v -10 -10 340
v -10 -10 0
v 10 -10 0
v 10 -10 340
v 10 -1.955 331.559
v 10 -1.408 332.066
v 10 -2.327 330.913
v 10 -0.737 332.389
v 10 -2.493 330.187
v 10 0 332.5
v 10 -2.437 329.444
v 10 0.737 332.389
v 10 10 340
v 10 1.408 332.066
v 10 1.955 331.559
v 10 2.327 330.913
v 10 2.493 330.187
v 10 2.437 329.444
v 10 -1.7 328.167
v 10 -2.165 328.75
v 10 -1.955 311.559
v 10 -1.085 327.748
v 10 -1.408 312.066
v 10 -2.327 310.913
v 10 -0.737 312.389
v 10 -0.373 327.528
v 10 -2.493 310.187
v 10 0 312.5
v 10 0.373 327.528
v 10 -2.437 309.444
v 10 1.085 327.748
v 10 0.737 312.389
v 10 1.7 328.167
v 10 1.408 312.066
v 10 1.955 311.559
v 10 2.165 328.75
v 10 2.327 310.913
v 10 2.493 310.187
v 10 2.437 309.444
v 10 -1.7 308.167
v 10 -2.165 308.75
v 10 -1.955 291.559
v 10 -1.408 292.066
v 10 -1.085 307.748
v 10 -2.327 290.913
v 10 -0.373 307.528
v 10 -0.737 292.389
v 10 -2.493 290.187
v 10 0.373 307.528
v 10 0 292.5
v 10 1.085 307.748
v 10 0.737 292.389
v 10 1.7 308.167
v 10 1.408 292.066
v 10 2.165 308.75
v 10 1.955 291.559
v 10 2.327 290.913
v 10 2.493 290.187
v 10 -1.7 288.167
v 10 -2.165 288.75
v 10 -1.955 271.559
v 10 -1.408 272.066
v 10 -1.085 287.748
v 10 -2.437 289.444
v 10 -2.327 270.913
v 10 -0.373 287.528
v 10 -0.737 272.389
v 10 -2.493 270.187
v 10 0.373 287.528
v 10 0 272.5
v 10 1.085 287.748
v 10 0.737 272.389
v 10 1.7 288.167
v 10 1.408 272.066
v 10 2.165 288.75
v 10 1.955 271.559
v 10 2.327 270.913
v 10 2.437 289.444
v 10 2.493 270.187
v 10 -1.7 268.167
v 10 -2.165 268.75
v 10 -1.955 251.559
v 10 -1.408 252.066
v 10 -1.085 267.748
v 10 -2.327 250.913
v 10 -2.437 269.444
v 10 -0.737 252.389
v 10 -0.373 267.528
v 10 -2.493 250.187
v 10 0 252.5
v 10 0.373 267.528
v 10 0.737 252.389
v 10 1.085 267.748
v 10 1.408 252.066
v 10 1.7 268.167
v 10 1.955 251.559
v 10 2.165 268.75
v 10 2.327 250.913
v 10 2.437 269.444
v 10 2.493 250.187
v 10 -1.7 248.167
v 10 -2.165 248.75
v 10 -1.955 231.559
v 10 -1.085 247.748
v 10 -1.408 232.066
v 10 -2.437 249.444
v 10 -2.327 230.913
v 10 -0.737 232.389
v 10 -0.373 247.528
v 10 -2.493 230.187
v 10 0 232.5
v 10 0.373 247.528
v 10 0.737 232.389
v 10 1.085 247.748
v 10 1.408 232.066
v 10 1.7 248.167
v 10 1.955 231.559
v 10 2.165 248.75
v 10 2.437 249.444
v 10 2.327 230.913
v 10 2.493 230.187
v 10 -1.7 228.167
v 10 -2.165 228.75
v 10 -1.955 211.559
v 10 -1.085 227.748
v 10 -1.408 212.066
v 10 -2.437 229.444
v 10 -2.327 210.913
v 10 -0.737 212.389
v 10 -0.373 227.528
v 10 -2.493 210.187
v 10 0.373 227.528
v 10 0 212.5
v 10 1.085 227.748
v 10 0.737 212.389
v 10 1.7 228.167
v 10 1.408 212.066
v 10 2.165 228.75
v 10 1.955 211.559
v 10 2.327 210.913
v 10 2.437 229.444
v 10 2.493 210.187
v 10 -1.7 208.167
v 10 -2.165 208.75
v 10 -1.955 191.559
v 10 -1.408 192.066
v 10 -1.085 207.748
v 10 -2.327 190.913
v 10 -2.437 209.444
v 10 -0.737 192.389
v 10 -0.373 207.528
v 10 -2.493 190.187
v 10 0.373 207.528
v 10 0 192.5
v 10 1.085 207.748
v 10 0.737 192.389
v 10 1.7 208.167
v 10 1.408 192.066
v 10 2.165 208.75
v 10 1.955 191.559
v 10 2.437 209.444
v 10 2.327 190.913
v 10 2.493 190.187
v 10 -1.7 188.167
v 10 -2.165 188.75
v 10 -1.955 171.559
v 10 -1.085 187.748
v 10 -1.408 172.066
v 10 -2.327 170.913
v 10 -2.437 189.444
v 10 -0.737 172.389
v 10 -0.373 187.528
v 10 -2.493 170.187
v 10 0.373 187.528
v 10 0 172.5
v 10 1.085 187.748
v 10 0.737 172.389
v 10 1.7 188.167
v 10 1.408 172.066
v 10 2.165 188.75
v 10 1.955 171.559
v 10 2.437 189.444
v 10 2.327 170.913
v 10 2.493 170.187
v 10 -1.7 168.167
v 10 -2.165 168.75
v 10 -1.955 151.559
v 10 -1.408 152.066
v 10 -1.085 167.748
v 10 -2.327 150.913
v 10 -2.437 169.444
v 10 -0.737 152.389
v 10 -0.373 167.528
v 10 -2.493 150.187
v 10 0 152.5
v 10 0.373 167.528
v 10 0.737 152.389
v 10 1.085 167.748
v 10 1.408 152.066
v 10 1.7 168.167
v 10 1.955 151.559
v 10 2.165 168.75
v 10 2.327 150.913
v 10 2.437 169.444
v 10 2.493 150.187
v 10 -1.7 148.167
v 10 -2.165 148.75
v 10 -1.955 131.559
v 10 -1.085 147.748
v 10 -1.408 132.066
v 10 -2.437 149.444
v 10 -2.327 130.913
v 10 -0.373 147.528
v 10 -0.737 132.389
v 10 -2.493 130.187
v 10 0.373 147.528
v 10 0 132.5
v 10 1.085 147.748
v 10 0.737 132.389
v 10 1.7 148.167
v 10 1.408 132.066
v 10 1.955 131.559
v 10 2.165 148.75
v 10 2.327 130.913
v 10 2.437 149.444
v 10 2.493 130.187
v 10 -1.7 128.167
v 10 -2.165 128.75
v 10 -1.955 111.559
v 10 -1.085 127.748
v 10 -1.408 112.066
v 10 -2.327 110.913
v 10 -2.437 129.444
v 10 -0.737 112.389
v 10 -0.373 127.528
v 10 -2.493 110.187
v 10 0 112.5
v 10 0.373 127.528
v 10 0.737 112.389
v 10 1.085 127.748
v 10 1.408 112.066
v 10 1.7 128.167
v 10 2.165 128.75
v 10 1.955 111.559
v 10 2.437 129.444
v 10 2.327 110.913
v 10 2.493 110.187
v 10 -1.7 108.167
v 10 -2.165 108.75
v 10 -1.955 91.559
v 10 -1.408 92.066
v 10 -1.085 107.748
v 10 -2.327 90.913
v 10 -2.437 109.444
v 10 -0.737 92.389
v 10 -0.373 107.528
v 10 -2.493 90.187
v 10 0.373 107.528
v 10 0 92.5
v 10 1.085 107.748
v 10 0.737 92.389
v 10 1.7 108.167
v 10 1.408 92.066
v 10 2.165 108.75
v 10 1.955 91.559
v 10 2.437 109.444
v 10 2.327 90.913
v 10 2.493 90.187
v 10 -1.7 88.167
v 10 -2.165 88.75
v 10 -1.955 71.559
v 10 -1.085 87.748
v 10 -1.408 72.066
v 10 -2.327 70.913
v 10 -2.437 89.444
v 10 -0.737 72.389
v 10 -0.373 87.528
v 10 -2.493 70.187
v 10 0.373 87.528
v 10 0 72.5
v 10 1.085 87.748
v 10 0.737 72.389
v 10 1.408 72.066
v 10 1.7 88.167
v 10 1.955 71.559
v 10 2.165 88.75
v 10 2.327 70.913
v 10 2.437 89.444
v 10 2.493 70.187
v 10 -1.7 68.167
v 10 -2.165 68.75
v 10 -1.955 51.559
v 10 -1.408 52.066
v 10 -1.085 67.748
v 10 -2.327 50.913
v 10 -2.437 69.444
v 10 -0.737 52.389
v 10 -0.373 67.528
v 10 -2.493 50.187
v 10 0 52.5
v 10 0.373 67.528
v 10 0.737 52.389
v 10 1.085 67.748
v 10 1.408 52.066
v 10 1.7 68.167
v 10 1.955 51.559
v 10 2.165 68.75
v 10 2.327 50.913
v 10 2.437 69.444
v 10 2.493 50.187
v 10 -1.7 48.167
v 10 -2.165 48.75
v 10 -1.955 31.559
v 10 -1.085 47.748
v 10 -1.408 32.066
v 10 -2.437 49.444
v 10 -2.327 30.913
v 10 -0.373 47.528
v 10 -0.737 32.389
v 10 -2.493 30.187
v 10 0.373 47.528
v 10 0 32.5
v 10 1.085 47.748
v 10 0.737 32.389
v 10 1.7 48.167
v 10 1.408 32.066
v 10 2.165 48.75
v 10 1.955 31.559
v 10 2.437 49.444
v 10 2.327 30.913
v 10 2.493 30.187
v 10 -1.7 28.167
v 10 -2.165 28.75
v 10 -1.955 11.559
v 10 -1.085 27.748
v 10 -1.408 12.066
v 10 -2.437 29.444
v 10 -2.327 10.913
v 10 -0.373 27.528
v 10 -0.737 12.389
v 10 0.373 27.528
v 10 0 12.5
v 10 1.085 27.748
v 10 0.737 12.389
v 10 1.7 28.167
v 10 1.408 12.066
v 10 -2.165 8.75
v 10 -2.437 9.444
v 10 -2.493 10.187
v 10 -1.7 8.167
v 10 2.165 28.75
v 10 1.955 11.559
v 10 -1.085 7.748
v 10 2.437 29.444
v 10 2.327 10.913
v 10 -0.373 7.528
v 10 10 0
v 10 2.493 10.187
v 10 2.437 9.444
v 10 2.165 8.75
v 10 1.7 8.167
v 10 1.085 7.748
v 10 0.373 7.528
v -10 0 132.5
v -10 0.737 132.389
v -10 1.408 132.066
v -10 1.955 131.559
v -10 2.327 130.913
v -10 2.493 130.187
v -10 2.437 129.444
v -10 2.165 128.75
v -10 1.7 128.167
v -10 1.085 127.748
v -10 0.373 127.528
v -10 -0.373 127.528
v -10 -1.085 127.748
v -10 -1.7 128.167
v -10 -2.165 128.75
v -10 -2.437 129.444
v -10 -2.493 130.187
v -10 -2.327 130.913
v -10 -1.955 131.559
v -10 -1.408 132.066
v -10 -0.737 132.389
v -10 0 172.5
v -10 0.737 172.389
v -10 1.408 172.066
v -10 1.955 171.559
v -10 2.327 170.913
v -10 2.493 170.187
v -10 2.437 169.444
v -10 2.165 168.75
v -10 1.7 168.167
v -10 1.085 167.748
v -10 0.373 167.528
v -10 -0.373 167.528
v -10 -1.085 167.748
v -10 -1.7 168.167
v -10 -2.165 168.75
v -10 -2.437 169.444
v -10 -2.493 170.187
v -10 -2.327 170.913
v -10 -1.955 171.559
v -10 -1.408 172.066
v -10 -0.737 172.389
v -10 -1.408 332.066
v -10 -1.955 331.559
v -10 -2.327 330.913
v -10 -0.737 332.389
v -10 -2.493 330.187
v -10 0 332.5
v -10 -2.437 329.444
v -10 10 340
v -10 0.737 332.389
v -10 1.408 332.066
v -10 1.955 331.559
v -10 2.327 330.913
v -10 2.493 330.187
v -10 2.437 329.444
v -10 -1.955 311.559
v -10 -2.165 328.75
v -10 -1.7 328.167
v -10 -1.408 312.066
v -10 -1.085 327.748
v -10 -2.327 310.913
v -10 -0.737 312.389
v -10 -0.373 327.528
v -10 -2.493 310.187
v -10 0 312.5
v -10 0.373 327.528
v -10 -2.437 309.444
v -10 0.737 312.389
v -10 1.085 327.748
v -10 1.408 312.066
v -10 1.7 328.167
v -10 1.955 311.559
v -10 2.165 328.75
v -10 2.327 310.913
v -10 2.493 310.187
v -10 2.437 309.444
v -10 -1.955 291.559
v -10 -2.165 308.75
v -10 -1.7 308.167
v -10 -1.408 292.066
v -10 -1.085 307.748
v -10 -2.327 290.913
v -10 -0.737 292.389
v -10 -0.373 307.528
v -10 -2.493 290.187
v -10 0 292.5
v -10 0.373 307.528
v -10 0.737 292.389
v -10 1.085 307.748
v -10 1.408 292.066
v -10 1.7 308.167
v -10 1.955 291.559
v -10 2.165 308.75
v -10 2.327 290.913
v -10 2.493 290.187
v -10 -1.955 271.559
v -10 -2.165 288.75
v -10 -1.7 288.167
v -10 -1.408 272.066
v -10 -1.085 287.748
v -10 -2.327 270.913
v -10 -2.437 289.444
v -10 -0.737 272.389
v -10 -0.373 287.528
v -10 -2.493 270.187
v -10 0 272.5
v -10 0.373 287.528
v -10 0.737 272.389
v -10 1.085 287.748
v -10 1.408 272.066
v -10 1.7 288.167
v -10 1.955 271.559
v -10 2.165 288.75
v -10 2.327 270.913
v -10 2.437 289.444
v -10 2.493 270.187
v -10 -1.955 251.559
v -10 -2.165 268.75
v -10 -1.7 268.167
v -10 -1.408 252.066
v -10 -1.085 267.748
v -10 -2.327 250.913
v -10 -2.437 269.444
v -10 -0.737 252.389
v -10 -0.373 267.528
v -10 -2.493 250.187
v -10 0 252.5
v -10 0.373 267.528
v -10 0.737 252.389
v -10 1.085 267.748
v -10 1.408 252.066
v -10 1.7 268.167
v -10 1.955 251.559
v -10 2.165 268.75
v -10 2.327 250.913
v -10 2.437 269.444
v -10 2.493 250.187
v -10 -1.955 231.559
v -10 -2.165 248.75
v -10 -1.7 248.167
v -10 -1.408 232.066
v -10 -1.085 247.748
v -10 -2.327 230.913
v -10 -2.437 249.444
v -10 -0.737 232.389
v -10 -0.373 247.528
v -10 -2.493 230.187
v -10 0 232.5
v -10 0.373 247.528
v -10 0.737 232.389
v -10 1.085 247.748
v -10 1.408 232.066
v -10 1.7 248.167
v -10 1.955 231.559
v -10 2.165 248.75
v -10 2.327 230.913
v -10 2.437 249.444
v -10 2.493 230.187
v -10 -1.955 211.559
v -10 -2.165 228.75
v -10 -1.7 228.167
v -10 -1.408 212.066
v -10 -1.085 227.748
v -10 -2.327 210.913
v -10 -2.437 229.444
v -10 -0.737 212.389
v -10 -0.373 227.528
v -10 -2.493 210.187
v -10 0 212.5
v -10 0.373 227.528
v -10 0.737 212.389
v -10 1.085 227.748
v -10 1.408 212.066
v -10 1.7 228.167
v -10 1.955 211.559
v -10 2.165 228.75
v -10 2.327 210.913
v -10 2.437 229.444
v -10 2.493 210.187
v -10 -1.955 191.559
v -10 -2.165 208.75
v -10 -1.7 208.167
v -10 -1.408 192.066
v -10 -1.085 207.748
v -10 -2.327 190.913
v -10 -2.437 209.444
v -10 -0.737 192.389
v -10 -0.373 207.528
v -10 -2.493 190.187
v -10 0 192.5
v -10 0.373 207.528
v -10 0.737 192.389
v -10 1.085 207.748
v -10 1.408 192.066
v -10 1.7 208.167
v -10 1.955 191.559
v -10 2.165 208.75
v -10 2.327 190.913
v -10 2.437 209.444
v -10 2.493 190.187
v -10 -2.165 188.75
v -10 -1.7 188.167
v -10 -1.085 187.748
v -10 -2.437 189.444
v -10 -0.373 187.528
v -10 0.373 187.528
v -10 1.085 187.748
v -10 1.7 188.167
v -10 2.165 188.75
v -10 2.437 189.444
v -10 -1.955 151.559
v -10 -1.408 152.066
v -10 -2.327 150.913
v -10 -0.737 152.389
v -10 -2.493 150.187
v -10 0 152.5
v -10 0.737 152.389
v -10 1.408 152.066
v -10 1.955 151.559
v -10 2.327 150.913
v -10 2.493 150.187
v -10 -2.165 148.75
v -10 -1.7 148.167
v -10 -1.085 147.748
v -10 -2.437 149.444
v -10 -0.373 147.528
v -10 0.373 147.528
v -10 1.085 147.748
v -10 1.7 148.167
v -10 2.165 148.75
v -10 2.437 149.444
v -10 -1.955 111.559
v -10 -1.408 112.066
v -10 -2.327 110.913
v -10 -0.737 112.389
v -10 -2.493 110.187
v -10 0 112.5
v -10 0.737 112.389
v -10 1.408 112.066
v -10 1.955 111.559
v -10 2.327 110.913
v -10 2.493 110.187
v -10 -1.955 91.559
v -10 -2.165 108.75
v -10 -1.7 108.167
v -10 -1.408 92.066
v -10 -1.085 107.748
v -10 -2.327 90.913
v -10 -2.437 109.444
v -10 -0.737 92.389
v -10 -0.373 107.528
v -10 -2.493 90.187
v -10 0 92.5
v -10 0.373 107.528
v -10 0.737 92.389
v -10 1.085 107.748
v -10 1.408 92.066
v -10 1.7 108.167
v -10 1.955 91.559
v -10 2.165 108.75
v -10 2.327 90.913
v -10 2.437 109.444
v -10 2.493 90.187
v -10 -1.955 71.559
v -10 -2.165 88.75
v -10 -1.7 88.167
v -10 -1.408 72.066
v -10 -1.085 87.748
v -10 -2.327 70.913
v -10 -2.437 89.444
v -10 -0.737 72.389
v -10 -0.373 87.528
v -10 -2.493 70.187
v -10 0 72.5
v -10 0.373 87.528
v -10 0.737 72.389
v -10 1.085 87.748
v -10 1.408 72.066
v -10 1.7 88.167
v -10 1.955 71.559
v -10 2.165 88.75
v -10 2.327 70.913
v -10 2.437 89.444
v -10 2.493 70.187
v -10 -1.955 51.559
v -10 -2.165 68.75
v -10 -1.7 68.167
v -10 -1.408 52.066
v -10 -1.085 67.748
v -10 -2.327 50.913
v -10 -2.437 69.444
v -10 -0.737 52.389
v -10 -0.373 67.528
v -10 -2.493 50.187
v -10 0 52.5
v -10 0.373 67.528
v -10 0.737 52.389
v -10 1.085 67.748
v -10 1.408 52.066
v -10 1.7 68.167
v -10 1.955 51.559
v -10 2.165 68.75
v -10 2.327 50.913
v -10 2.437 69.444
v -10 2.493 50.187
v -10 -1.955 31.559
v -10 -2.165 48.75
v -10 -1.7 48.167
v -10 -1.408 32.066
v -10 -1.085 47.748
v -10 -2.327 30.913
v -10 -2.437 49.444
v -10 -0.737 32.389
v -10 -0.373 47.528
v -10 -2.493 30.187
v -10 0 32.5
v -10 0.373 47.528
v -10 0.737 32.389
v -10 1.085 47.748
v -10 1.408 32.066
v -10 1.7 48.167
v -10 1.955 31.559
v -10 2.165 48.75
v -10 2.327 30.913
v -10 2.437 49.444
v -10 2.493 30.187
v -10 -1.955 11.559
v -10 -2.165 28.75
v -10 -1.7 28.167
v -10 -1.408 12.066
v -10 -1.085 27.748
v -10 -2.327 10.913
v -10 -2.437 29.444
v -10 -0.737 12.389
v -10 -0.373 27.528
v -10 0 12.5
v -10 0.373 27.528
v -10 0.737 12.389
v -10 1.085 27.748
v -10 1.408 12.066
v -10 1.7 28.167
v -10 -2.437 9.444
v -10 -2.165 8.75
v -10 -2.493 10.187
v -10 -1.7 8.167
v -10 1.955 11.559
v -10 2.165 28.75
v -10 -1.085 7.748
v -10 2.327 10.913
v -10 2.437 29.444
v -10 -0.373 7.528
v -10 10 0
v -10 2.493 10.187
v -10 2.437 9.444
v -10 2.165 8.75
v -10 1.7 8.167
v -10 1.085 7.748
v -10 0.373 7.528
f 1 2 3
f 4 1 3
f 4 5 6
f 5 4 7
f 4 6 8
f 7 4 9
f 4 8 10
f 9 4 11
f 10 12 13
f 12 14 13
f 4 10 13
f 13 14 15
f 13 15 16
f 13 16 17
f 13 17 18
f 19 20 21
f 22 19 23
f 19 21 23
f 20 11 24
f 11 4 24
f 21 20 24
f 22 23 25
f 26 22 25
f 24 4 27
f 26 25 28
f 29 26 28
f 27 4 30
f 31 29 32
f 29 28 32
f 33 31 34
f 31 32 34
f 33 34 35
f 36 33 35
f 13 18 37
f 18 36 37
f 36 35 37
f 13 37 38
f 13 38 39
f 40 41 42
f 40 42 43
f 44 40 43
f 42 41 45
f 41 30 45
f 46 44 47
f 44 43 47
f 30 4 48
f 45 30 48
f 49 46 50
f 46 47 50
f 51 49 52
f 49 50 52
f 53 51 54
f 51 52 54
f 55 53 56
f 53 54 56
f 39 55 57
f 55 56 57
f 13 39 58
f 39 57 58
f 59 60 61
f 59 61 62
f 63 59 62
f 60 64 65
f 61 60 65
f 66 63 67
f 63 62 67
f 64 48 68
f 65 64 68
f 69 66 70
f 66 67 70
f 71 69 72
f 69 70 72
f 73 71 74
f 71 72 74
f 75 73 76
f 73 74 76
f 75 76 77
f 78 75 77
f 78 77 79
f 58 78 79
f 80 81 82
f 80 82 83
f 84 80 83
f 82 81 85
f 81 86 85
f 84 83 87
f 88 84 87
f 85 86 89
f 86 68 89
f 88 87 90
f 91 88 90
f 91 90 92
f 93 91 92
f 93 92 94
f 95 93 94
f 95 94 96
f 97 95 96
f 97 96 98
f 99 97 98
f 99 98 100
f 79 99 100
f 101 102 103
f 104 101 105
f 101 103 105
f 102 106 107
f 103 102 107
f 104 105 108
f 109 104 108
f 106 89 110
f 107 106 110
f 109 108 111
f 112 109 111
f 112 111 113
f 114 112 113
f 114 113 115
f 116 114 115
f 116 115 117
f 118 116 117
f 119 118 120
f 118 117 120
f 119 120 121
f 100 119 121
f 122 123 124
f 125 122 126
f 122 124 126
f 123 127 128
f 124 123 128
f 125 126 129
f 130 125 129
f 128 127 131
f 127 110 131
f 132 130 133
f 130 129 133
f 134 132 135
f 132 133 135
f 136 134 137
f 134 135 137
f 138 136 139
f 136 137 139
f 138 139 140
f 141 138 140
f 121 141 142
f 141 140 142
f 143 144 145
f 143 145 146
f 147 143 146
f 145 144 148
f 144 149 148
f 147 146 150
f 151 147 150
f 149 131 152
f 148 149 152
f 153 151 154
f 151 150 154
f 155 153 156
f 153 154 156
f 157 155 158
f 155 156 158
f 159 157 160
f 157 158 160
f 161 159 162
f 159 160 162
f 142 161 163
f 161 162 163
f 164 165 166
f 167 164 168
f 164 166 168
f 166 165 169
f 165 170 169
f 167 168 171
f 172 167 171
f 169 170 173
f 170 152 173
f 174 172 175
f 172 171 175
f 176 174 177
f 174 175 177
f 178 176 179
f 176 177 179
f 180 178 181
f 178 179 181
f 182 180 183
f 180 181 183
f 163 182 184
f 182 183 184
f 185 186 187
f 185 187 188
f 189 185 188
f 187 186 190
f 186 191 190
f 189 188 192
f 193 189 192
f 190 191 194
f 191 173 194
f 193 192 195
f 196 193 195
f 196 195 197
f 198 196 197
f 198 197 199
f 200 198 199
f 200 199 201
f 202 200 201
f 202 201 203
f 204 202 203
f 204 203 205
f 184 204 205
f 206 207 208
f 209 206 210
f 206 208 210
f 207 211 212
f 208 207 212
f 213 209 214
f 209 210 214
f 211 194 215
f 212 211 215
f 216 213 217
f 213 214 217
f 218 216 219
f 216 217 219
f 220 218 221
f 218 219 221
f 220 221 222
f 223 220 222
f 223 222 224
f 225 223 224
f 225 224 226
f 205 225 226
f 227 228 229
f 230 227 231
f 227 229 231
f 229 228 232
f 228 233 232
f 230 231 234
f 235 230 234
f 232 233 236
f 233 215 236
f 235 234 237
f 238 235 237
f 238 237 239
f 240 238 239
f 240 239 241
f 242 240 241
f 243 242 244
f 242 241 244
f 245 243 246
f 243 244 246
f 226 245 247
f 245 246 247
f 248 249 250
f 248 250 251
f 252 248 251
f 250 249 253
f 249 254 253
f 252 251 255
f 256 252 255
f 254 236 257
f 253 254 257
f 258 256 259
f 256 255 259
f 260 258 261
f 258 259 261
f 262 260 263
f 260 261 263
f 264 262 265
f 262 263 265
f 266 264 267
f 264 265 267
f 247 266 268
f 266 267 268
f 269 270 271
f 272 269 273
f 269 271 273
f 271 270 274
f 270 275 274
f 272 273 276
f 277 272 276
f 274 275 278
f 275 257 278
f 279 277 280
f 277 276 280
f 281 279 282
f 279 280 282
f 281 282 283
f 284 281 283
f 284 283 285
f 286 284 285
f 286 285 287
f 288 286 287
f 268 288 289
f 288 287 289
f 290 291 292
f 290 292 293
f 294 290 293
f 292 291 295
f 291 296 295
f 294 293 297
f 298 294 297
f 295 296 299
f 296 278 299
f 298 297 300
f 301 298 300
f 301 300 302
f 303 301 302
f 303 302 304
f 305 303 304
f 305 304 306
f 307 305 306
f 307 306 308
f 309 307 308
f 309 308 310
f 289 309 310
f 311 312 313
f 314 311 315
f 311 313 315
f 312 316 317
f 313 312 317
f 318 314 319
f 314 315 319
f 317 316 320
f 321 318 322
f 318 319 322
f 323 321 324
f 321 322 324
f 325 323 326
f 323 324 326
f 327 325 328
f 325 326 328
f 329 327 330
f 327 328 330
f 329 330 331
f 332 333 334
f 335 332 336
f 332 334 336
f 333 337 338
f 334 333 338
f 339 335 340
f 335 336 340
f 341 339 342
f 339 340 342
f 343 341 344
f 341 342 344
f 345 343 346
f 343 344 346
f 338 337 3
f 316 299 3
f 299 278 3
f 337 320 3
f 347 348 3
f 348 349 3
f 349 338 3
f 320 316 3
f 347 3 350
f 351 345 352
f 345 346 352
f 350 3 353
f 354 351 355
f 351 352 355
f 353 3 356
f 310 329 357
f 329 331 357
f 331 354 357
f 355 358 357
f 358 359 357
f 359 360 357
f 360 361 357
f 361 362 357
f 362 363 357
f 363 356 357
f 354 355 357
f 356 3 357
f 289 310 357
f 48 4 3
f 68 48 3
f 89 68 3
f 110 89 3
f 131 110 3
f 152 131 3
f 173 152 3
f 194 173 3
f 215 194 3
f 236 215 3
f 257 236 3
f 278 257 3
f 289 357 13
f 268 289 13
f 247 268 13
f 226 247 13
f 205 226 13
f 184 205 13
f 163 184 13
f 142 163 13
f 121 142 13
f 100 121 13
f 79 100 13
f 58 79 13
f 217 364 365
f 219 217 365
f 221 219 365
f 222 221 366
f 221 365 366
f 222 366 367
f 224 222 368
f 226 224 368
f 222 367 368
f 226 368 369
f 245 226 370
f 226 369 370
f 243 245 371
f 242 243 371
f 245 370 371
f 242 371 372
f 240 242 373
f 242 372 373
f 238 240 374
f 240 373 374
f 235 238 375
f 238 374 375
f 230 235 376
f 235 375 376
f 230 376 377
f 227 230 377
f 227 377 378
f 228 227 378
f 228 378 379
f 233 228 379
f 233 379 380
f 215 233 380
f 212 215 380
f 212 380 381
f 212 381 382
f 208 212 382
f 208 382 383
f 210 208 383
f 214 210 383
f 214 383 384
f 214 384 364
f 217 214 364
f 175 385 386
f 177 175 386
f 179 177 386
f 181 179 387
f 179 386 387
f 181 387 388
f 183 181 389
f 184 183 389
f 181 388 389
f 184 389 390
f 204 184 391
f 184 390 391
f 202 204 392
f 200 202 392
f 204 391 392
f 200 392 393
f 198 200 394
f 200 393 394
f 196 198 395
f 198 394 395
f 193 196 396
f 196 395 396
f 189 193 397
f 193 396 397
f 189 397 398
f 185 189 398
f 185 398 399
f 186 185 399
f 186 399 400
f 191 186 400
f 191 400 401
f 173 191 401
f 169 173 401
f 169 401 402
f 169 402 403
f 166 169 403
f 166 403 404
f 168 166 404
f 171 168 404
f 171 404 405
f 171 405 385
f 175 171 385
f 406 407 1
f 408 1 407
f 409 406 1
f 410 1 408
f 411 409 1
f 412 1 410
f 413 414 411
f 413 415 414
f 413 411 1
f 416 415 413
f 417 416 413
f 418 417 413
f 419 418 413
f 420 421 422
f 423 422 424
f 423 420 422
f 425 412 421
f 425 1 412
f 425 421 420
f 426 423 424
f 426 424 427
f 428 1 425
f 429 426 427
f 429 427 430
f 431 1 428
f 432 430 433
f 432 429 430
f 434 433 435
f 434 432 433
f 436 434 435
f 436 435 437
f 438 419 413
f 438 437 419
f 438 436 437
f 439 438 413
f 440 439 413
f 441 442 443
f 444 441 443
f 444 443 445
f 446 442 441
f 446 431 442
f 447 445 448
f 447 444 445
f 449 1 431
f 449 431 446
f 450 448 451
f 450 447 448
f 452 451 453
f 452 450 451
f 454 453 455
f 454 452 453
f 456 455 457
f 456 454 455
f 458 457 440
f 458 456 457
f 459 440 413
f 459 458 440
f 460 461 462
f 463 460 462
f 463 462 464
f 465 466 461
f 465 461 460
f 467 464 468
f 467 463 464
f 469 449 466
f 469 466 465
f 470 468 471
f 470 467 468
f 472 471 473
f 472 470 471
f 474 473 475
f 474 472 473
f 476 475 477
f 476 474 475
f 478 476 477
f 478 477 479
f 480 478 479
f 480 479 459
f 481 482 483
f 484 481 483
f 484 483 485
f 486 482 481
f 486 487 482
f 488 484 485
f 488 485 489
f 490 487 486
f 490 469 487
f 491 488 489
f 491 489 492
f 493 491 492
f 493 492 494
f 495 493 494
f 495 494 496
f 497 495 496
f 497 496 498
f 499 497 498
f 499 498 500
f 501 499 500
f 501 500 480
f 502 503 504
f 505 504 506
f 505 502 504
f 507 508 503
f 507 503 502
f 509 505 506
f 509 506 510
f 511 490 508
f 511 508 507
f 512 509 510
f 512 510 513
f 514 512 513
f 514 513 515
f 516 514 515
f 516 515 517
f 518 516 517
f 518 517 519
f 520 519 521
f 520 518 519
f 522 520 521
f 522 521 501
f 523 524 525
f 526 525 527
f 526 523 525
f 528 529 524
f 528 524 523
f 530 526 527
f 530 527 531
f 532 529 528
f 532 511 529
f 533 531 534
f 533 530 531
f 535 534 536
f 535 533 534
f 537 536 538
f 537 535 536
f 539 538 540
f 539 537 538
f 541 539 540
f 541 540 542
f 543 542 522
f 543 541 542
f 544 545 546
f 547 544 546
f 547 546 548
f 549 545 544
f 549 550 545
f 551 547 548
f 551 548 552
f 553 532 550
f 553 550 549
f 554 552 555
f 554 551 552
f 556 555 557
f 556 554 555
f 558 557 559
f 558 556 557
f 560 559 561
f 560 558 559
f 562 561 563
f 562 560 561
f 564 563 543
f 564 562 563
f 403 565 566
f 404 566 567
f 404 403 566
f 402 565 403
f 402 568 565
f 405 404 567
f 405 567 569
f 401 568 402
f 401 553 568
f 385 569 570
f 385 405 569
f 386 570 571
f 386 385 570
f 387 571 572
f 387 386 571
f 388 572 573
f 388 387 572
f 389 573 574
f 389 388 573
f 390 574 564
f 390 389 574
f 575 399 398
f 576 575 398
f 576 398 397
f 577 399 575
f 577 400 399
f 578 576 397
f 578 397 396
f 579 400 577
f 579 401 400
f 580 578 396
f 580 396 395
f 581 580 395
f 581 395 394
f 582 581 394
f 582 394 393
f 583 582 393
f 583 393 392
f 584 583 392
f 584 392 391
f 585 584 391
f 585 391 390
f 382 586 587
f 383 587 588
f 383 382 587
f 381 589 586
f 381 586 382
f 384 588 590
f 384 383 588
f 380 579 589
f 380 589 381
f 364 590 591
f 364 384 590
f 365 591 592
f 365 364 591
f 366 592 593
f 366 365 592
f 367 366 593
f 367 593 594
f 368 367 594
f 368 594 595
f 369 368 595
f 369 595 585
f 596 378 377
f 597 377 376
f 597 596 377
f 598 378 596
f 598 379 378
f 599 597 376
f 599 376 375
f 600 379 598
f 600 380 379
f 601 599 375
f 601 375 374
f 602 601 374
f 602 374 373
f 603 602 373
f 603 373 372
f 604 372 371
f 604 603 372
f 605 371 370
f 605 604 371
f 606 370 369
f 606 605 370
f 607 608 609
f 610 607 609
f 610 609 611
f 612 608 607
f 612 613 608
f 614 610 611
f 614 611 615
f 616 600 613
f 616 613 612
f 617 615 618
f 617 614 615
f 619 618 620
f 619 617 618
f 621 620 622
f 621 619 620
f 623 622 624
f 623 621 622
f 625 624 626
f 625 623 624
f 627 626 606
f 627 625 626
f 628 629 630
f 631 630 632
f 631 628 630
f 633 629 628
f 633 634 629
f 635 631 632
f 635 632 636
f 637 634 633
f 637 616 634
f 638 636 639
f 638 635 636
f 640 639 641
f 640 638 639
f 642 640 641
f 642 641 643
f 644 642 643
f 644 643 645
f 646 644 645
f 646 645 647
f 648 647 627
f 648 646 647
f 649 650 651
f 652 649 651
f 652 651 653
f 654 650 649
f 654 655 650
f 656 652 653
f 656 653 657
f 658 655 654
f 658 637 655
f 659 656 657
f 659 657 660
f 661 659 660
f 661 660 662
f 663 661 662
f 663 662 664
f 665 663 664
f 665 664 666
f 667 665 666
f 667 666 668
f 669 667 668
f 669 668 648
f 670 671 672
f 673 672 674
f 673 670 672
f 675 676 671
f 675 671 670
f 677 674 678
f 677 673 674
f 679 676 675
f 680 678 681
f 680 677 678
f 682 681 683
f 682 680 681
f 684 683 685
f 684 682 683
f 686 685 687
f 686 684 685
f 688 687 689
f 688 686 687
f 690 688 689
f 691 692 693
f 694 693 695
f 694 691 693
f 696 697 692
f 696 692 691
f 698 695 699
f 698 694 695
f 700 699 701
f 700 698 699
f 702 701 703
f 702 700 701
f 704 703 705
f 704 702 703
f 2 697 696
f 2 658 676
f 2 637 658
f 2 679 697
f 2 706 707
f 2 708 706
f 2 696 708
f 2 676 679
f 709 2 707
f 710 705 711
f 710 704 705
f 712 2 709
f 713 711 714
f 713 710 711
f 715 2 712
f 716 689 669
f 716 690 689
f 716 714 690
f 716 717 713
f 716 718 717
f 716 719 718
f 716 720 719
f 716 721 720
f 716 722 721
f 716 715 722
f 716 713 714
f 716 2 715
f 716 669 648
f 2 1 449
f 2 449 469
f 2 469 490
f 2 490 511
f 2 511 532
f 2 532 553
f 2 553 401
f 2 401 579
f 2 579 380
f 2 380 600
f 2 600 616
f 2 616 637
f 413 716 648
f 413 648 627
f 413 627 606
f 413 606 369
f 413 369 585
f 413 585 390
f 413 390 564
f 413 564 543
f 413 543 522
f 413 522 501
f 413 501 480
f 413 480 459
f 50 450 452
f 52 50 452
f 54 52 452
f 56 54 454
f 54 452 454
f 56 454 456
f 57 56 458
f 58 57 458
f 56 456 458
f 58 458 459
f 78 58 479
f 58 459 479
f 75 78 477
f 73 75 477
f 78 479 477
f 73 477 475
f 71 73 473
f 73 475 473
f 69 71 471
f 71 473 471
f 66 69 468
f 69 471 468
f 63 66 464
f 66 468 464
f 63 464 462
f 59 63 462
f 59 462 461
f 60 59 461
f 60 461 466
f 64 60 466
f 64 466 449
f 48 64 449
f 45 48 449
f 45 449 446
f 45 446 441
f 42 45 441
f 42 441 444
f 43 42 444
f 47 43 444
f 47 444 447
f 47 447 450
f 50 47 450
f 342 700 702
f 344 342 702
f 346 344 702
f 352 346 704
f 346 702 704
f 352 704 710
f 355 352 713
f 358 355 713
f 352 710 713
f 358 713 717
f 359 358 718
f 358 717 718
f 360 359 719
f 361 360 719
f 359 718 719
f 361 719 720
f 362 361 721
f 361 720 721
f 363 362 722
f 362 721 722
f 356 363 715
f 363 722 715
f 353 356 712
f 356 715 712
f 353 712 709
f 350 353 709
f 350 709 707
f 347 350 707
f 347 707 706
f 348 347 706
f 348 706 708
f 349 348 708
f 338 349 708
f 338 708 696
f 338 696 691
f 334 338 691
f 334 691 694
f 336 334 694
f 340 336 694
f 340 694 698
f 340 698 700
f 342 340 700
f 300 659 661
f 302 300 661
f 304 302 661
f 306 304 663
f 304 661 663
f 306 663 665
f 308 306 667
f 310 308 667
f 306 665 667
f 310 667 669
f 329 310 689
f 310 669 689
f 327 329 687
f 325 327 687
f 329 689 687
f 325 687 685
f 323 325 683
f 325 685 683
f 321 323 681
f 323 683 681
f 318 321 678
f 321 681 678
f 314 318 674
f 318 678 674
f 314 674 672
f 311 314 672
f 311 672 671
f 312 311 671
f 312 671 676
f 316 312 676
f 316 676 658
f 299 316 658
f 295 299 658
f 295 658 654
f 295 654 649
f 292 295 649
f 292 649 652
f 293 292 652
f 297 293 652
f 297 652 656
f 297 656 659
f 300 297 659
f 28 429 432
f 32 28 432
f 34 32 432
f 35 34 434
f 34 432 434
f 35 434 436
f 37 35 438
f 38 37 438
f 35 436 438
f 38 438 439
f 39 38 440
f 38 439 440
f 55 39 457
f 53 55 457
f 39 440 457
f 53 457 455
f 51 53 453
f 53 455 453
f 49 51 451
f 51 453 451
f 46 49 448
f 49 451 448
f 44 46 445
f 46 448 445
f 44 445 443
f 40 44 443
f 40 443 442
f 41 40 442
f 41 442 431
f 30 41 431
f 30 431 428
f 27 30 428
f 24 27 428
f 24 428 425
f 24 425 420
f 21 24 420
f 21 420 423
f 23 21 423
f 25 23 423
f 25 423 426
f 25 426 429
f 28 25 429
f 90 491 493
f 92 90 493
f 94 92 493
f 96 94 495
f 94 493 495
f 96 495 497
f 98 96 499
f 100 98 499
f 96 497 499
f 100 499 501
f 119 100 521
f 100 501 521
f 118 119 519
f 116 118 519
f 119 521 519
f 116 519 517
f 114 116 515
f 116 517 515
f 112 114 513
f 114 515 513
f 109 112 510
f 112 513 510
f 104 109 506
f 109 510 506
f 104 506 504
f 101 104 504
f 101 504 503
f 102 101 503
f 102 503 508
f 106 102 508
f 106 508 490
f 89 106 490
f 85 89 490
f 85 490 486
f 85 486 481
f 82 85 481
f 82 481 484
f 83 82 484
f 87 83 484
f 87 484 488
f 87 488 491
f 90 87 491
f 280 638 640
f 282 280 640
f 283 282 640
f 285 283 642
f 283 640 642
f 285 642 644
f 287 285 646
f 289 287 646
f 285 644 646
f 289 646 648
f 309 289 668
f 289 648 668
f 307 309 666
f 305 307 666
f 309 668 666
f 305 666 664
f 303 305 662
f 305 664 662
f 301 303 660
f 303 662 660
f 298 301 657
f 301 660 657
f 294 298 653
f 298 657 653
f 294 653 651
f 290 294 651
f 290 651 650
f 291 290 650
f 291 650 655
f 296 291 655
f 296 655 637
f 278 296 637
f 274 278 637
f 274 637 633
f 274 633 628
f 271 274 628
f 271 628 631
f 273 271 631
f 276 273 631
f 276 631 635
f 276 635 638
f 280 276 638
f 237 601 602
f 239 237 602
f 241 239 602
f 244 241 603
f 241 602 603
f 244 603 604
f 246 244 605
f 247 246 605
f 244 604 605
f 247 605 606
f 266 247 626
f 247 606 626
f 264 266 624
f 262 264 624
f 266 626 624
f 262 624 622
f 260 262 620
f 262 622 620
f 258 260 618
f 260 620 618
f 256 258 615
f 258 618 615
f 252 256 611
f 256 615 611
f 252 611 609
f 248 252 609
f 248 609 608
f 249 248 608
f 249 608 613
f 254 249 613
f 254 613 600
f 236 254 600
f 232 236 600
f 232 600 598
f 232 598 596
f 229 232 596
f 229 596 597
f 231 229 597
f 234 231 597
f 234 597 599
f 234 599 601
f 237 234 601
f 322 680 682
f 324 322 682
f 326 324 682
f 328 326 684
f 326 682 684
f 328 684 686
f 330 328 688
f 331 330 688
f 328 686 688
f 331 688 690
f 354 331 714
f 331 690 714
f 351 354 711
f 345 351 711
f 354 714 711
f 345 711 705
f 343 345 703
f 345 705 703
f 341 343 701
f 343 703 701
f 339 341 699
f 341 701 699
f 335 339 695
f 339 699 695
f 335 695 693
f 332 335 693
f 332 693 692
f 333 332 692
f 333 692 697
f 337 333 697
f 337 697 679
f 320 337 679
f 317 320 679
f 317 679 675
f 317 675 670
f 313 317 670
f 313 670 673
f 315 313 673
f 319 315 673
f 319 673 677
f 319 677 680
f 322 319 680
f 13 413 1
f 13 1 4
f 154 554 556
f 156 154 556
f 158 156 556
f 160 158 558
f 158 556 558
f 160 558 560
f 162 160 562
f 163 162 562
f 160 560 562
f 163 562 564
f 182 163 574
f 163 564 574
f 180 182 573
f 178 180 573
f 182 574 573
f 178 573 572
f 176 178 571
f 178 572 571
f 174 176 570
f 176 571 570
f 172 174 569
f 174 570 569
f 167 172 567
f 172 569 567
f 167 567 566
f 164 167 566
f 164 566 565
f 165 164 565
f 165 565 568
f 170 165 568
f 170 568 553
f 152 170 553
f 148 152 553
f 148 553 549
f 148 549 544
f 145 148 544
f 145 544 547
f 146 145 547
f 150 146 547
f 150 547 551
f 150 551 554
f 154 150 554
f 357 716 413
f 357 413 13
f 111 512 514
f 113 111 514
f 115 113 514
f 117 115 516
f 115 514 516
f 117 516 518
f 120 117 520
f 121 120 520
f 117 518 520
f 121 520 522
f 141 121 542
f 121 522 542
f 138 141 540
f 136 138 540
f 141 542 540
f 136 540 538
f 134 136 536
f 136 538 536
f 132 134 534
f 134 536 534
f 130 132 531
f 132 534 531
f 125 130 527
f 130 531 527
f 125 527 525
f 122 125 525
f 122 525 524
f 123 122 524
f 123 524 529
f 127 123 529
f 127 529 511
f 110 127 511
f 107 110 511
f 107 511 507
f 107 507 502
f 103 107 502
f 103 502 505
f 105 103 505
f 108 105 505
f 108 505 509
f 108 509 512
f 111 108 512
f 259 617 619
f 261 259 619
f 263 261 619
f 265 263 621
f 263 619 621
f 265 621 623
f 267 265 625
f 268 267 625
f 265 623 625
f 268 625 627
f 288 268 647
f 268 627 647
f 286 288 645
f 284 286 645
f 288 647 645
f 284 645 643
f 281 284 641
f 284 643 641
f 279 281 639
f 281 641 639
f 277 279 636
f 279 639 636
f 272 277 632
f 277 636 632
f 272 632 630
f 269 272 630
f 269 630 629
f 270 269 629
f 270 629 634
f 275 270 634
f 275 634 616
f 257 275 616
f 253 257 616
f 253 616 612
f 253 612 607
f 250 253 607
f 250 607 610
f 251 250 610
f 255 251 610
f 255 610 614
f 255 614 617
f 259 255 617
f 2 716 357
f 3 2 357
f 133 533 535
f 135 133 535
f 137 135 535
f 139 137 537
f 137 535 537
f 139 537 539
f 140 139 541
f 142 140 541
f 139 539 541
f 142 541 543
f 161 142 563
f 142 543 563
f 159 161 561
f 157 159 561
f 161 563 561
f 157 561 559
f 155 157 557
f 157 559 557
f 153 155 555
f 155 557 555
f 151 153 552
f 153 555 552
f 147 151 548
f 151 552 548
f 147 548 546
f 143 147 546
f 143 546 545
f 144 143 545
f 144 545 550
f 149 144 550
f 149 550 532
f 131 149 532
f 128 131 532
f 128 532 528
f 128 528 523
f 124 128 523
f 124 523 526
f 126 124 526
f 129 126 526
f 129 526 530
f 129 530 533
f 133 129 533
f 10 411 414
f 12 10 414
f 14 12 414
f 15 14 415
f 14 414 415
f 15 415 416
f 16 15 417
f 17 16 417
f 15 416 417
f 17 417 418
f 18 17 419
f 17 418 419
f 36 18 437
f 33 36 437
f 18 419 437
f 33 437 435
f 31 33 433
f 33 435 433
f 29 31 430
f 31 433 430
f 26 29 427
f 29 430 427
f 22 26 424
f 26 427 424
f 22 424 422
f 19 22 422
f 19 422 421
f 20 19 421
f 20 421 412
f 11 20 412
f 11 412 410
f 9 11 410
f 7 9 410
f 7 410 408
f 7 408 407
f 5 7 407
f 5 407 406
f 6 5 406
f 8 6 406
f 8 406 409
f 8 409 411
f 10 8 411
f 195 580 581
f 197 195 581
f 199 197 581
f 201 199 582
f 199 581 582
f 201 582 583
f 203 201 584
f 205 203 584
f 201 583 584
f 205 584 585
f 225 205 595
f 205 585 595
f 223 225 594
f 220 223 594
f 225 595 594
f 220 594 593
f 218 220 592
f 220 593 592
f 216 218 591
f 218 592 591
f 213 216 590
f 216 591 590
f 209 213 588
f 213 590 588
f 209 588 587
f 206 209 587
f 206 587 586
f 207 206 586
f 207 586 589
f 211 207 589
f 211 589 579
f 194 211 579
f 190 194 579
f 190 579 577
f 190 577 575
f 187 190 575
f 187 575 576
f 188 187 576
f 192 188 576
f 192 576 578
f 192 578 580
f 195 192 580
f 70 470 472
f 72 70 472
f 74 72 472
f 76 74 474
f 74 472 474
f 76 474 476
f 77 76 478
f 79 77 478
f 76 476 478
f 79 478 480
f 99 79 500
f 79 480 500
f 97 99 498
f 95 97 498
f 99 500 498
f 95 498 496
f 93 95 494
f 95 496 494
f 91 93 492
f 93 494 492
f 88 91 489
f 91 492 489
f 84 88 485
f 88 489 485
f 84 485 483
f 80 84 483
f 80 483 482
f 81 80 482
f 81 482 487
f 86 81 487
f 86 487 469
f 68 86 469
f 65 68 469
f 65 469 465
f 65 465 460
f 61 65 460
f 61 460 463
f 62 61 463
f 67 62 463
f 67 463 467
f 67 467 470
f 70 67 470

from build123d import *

# Parameters (mm, degrees)
SKETCH1_W             = 20
SKETCH1_H             = 20
BOSS_EXTRUDE1_DEPTH   = 340
F_5_0MM_DOWEL_HOLE1_D = 5
LPATTERN2_COUNT       = 17
LPATTERN2_PITCH       = 20


with BuildPart() as part:
    # Sketch1 → Boss-Extrude1 (new body)
    with BuildSketch(Plane.XY):
        Rectangle(SKETCH1_W, SKETCH1_H)
    extrude(amount=BOSS_EXTRUDE1_DEPTH)

    # Ø5.0mm Dowel Hole1 (through all)
    with Locations(Plane(origin=(10, 0, 0), x_dir=(0, 0, -1), z_dir=(1, 0, 0))):
        with Locations((-10, 0)):
            f_5_0mm_dowel_hole1 = Hole(F_5_0MM_DOWEL_HOLE1_D / 2)

    # LPattern2: Ø5.0mm Dowel Hole1 ×17
    with Locations(*[(0, 0, i * LPATTERN2_PITCH) for i in range(1, LPATTERN2_COUNT)]):
        add(f_5_0mm_dowel_hole1, mode=Mode.SUBTRACT)


solid = part.part
